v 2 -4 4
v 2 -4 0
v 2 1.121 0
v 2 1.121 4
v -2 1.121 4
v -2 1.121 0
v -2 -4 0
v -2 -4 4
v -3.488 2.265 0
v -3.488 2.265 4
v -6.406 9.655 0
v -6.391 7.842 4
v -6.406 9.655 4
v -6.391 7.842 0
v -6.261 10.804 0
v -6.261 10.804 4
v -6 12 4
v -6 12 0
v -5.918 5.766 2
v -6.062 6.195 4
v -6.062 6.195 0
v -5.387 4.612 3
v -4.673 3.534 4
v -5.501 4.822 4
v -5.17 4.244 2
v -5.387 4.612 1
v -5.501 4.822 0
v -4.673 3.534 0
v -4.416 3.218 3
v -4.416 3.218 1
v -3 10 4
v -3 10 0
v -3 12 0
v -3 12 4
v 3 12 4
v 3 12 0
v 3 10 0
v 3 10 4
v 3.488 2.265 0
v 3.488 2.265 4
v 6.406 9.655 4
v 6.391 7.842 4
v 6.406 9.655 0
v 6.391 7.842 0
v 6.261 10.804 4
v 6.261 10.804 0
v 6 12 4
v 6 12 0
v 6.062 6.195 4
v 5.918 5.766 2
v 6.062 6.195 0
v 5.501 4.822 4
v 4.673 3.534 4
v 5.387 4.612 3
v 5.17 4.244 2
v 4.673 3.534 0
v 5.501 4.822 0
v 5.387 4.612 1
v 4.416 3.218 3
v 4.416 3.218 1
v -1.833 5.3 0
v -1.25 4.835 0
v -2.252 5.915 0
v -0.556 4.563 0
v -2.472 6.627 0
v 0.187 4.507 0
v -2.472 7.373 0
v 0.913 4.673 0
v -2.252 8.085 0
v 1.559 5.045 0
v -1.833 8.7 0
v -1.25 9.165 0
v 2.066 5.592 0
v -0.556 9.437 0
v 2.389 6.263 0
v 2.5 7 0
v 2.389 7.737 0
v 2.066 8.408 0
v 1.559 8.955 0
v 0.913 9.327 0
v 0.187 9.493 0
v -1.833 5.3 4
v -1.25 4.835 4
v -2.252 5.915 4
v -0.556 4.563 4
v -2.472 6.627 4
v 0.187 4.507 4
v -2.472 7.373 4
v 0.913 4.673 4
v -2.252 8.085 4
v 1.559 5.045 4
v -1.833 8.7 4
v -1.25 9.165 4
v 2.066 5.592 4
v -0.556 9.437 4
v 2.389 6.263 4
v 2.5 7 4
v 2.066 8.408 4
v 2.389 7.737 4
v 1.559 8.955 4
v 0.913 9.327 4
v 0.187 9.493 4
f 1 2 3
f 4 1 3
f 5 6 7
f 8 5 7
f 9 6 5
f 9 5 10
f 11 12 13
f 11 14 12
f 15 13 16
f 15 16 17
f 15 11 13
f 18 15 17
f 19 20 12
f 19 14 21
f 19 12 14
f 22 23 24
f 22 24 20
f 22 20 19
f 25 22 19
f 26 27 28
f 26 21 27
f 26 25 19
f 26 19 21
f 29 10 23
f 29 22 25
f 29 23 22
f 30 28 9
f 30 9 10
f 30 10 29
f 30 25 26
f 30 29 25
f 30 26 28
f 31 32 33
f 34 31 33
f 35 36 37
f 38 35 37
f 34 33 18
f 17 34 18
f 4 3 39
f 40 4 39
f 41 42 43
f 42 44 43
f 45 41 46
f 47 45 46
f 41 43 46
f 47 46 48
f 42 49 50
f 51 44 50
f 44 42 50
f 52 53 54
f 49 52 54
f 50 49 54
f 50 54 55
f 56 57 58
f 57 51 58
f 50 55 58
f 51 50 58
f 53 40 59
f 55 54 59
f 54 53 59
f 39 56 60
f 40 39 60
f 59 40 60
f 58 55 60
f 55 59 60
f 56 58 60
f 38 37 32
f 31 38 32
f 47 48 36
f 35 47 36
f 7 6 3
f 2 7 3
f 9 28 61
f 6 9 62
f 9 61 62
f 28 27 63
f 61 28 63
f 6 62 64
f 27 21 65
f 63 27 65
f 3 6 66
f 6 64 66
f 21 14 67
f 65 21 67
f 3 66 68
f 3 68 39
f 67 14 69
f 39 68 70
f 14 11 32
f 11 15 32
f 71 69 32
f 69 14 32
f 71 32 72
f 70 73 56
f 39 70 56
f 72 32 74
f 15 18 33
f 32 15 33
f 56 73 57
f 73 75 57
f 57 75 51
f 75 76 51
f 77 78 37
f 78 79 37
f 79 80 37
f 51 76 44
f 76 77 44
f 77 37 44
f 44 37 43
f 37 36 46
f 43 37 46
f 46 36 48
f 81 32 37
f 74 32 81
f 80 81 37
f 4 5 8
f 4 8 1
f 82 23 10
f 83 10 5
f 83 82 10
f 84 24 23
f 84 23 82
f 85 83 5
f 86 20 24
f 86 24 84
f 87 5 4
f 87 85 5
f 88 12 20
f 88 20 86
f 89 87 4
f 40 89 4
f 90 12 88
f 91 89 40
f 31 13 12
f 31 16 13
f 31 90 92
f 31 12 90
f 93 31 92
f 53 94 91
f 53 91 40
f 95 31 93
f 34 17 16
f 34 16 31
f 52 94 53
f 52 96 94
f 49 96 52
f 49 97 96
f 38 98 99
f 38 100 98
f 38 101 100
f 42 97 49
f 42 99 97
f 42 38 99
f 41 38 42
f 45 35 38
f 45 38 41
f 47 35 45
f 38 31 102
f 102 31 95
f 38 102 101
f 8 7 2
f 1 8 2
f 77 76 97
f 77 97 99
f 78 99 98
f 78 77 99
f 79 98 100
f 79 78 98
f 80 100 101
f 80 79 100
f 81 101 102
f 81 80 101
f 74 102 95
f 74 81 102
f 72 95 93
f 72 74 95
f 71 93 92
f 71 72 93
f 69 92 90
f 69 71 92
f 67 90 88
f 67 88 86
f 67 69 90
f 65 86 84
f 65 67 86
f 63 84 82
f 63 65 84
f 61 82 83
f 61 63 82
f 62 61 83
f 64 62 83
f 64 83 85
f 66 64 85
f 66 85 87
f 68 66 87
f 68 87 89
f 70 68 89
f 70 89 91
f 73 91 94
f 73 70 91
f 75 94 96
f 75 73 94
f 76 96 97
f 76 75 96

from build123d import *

# Parameters (mm, degrees)
SKETCH1_R           = 2.5
BOSS_EXTRUDE1_DEPTH = 4


with BuildPart() as part:
    # Sketch1 → Boss-Extrude1 (new body)
    with BuildSketch(Plane.XY):
        with BuildLine():
            Line((2, -4), (2, 1.120548597))
            add(Edge.make_bspline(
                [(2, 1.120548597), (7.835899457, 4.971392719), (6, 12)],
                knots=[0.134548696, 0.134548696, 0.134548696, 1, 1, 1], degree=2))
            Line((6, 12), (3, 12))
            Line((3, 12), (3, 10))
            Line((3, 10), (-3, 10))
            Line((-3, 10), (-3, 12))
            Line((-3, 12), (-6, 12))
            add(Edge.make_bspline(
                [(-2, 1.120548597), (-7.835899457, 4.971392719), (-6, 12)],
                knots=[0.134548696, 0.134548696, 0.134548696, 1, 1, 1], degree=2))
            Line((-2, 1.120548597), (-2, -4))
            Line((-2, -4), (2, -4))
        make_face()
        with Locations((0, 7)):
            Circle(SKETCH1_R, mode=Mode.SUBTRACT)
    extrude(amount=BOSS_EXTRUDE1_DEPTH)


solid = part.part
